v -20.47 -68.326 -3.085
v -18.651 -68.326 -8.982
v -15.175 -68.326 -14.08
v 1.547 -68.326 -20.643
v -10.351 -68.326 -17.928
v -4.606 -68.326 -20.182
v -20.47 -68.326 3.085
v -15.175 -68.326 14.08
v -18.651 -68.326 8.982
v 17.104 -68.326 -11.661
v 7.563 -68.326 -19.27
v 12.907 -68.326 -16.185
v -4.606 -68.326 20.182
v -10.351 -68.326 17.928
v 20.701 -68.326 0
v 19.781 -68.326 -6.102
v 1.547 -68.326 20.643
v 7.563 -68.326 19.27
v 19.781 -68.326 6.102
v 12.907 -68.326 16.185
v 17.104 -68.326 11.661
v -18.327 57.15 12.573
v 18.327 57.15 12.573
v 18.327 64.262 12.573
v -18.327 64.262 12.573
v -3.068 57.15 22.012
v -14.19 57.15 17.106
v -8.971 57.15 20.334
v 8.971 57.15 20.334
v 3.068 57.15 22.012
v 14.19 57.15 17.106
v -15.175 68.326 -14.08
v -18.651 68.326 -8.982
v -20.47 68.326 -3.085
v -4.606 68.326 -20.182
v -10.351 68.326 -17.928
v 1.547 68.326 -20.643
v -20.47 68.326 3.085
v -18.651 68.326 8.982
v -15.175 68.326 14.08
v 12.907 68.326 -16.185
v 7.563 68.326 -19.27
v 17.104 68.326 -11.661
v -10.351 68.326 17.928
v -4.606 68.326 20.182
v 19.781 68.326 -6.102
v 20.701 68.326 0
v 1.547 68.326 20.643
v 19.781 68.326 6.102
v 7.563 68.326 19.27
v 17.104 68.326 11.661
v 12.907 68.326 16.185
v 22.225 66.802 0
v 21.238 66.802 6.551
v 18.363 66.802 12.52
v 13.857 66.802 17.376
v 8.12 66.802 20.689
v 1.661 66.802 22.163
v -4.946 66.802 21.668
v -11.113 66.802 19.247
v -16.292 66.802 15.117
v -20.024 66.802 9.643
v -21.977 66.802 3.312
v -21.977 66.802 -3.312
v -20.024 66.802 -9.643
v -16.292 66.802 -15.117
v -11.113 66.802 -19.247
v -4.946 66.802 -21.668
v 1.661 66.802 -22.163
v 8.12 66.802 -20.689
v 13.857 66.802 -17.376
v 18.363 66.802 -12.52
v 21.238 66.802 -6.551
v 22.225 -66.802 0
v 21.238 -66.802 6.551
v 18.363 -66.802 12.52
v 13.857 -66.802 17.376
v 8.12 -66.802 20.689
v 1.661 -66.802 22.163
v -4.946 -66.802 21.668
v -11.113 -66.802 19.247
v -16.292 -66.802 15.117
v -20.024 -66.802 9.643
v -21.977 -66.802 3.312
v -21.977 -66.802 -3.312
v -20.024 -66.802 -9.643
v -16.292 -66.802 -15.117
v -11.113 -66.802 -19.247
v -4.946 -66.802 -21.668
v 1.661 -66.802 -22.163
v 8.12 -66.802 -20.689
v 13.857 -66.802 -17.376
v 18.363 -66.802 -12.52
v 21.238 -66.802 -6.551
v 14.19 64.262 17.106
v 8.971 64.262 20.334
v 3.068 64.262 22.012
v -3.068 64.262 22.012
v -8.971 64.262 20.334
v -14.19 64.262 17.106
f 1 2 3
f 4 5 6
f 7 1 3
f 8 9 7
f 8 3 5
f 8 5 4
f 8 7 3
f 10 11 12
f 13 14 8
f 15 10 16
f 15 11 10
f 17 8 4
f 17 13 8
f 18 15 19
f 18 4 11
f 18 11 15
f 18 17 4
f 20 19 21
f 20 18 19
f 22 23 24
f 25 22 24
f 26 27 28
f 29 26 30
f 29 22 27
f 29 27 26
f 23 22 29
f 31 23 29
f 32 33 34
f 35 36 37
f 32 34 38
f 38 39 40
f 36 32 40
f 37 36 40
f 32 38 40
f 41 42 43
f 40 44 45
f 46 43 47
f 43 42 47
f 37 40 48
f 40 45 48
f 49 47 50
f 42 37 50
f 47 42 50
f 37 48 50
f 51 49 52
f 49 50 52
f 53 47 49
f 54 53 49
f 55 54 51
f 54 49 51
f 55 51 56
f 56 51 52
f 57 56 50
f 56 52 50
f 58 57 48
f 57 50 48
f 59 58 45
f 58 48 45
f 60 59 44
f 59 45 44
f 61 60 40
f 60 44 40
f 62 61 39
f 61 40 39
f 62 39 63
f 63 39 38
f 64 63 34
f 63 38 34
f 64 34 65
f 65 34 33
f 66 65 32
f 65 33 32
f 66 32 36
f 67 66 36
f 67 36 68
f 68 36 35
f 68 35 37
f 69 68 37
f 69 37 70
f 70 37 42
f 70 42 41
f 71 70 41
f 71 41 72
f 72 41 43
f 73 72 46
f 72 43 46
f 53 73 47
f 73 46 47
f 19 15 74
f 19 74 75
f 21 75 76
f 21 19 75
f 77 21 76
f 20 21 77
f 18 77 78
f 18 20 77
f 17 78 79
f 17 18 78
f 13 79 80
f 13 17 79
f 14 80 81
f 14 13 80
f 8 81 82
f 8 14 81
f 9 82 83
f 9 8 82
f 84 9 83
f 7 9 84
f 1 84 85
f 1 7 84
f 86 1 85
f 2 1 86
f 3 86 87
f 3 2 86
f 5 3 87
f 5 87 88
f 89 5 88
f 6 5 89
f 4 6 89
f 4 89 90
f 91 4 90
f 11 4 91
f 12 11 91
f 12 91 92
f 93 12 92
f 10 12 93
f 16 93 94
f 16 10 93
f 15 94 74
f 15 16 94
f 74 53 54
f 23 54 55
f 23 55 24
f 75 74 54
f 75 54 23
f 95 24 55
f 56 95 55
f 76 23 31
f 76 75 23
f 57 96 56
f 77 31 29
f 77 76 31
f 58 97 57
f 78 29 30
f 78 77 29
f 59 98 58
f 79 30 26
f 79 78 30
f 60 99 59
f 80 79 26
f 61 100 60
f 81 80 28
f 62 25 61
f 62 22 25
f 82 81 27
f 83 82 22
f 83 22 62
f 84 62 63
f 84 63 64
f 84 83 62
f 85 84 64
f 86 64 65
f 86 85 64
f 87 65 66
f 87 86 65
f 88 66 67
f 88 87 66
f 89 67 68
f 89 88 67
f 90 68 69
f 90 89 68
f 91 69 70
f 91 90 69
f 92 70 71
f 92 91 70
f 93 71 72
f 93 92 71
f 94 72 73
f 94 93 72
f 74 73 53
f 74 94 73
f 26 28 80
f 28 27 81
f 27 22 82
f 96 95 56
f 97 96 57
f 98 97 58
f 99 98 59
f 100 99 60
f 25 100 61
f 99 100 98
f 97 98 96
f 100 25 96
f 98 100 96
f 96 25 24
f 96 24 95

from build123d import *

# Parameters (mm, degrees)
F0_R     = 22.225
F1_DEPTH = 68.326
F2_SIZE  = 1.524
F3_W     = 7.112
F3_H     = 19.304
F4_DEPTH = 25.4


with BuildPart() as f1:
    # F0 (on Front) → F1 (new body, symmetric)
    with BuildSketch(Plane.XZ):
        Circle(F0_R)
    extrude(amount=F1_DEPTH, both=True)

    # F2
    f2_edges = [f1.edges().sort_by_distance(p)[0] for p in [
        (-22.225, -68.326, 0),
        (-22.225, 68.326, 0),
    ]]
    chamfer(f2_edges, length=F2_SIZE)

    # F3 (on Right) → F4 (cut, symmetric)
    with BuildSketch(Plane.YZ):
        with Locations((60.706, 22.225)):
            Rectangle(F3_W, F3_H)
    extrude(amount=F4_DEPTH, both=True, mode=Mode.SUBTRACT)


solid = f1.part
